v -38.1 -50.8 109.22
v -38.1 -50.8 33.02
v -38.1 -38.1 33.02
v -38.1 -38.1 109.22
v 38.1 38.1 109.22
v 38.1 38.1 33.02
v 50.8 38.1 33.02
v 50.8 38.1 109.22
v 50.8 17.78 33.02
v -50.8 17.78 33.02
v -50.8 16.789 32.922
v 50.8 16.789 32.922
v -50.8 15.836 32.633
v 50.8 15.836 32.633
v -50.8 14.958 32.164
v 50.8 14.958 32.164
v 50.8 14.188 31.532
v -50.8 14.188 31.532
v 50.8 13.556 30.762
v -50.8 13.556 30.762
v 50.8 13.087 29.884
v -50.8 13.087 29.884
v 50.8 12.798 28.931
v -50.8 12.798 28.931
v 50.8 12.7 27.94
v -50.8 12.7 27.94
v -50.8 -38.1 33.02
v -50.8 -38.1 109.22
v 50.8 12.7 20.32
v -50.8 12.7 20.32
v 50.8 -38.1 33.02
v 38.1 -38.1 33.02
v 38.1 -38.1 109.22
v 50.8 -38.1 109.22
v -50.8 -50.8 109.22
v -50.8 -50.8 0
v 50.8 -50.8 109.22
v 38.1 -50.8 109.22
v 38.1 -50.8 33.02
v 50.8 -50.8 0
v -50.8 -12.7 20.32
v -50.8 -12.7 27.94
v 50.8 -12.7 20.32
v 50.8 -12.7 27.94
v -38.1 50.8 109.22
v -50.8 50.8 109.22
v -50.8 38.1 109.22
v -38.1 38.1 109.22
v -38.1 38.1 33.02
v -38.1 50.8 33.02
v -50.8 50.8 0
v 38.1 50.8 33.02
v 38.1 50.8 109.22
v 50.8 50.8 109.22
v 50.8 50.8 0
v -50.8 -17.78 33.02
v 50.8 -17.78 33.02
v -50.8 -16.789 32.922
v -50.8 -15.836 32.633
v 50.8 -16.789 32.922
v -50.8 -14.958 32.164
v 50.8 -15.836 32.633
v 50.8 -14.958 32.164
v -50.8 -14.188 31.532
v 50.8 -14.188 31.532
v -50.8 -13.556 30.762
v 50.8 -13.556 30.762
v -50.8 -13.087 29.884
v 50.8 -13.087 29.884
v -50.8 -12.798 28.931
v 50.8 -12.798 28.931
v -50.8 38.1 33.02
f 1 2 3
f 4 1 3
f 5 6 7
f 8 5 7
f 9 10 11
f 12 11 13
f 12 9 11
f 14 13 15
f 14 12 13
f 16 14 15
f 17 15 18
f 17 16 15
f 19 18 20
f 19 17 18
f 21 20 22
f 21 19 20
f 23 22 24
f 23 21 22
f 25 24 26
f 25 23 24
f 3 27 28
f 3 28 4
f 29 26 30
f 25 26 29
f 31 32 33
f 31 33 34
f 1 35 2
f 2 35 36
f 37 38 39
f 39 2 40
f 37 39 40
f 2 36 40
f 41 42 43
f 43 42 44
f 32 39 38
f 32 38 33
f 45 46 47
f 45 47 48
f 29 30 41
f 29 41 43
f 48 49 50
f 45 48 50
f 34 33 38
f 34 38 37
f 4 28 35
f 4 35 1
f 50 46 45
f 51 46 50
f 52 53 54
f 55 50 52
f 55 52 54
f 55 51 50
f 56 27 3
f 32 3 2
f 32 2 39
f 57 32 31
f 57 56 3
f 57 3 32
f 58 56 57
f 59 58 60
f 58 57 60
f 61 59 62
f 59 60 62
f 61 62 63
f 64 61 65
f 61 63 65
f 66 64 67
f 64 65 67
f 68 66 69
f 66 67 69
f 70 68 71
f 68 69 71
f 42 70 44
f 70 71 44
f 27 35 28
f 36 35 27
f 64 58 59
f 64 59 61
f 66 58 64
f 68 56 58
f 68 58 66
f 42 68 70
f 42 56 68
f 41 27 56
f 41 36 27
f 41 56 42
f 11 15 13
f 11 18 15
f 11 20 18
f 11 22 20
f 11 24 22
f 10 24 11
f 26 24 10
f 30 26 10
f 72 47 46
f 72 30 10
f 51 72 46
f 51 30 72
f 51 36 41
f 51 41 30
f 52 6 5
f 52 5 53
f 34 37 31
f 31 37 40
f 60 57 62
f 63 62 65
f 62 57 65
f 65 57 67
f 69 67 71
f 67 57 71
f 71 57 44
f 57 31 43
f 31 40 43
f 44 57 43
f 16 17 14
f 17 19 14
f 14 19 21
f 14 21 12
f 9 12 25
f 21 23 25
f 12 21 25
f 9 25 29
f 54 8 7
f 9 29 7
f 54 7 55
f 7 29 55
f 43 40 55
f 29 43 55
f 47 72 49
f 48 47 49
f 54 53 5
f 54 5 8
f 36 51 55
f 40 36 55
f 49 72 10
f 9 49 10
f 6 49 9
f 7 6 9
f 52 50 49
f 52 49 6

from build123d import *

# Parameters (mm, degrees)
F0_W     = 101.6
F0_H     = 101.6
F1_DEPTH = 33.02
F2_W     = 12.7
F2_H     = 12.7
F3_DEPTH = 76.2
F4_W     = 101.6
F4_H     = 25.4
F5_DEPTH = 12.7
F6_R     = 5.08


with BuildPart() as f1:
    # F0 (on Top) → F1 (new body)
    with BuildSketch(Plane.XY):
        Rectangle(F0_W, F0_H)
    extrude(amount=F1_DEPTH)

    # F2 (on face) → F3 (join)
    with BuildSketch(Plane.XY.offset(33.02)):
        with Locations((44.45, -44.45)):
            Rectangle(F2_W, F2_H)
        with Locations((-44.45, -44.45)):
            Rectangle(F2_W, F2_H)
        with Locations((-44.45, 44.45)):
            Rectangle(F2_W, F2_H)
        with Locations((44.45, 44.45)):
            Rectangle(F2_W, F2_H)
    extrude(amount=F3_DEPTH)

    # F4 (on face) → F5 (cut)
    with BuildSketch(Plane.XY.offset(33.02)):
        Rectangle(F4_W, F4_H)
    extrude(amount=-F5_DEPTH, mode=Mode.SUBTRACT)

    # F6
    f6_edges = [f1.edges().sort_by_distance(p)[0] for p in [
        (0, 12.7, 33.02),
        (0, -12.7, 33.02),
    ]]
    fillet(f6_edges, radius=F6_R)


solid = f1.part
